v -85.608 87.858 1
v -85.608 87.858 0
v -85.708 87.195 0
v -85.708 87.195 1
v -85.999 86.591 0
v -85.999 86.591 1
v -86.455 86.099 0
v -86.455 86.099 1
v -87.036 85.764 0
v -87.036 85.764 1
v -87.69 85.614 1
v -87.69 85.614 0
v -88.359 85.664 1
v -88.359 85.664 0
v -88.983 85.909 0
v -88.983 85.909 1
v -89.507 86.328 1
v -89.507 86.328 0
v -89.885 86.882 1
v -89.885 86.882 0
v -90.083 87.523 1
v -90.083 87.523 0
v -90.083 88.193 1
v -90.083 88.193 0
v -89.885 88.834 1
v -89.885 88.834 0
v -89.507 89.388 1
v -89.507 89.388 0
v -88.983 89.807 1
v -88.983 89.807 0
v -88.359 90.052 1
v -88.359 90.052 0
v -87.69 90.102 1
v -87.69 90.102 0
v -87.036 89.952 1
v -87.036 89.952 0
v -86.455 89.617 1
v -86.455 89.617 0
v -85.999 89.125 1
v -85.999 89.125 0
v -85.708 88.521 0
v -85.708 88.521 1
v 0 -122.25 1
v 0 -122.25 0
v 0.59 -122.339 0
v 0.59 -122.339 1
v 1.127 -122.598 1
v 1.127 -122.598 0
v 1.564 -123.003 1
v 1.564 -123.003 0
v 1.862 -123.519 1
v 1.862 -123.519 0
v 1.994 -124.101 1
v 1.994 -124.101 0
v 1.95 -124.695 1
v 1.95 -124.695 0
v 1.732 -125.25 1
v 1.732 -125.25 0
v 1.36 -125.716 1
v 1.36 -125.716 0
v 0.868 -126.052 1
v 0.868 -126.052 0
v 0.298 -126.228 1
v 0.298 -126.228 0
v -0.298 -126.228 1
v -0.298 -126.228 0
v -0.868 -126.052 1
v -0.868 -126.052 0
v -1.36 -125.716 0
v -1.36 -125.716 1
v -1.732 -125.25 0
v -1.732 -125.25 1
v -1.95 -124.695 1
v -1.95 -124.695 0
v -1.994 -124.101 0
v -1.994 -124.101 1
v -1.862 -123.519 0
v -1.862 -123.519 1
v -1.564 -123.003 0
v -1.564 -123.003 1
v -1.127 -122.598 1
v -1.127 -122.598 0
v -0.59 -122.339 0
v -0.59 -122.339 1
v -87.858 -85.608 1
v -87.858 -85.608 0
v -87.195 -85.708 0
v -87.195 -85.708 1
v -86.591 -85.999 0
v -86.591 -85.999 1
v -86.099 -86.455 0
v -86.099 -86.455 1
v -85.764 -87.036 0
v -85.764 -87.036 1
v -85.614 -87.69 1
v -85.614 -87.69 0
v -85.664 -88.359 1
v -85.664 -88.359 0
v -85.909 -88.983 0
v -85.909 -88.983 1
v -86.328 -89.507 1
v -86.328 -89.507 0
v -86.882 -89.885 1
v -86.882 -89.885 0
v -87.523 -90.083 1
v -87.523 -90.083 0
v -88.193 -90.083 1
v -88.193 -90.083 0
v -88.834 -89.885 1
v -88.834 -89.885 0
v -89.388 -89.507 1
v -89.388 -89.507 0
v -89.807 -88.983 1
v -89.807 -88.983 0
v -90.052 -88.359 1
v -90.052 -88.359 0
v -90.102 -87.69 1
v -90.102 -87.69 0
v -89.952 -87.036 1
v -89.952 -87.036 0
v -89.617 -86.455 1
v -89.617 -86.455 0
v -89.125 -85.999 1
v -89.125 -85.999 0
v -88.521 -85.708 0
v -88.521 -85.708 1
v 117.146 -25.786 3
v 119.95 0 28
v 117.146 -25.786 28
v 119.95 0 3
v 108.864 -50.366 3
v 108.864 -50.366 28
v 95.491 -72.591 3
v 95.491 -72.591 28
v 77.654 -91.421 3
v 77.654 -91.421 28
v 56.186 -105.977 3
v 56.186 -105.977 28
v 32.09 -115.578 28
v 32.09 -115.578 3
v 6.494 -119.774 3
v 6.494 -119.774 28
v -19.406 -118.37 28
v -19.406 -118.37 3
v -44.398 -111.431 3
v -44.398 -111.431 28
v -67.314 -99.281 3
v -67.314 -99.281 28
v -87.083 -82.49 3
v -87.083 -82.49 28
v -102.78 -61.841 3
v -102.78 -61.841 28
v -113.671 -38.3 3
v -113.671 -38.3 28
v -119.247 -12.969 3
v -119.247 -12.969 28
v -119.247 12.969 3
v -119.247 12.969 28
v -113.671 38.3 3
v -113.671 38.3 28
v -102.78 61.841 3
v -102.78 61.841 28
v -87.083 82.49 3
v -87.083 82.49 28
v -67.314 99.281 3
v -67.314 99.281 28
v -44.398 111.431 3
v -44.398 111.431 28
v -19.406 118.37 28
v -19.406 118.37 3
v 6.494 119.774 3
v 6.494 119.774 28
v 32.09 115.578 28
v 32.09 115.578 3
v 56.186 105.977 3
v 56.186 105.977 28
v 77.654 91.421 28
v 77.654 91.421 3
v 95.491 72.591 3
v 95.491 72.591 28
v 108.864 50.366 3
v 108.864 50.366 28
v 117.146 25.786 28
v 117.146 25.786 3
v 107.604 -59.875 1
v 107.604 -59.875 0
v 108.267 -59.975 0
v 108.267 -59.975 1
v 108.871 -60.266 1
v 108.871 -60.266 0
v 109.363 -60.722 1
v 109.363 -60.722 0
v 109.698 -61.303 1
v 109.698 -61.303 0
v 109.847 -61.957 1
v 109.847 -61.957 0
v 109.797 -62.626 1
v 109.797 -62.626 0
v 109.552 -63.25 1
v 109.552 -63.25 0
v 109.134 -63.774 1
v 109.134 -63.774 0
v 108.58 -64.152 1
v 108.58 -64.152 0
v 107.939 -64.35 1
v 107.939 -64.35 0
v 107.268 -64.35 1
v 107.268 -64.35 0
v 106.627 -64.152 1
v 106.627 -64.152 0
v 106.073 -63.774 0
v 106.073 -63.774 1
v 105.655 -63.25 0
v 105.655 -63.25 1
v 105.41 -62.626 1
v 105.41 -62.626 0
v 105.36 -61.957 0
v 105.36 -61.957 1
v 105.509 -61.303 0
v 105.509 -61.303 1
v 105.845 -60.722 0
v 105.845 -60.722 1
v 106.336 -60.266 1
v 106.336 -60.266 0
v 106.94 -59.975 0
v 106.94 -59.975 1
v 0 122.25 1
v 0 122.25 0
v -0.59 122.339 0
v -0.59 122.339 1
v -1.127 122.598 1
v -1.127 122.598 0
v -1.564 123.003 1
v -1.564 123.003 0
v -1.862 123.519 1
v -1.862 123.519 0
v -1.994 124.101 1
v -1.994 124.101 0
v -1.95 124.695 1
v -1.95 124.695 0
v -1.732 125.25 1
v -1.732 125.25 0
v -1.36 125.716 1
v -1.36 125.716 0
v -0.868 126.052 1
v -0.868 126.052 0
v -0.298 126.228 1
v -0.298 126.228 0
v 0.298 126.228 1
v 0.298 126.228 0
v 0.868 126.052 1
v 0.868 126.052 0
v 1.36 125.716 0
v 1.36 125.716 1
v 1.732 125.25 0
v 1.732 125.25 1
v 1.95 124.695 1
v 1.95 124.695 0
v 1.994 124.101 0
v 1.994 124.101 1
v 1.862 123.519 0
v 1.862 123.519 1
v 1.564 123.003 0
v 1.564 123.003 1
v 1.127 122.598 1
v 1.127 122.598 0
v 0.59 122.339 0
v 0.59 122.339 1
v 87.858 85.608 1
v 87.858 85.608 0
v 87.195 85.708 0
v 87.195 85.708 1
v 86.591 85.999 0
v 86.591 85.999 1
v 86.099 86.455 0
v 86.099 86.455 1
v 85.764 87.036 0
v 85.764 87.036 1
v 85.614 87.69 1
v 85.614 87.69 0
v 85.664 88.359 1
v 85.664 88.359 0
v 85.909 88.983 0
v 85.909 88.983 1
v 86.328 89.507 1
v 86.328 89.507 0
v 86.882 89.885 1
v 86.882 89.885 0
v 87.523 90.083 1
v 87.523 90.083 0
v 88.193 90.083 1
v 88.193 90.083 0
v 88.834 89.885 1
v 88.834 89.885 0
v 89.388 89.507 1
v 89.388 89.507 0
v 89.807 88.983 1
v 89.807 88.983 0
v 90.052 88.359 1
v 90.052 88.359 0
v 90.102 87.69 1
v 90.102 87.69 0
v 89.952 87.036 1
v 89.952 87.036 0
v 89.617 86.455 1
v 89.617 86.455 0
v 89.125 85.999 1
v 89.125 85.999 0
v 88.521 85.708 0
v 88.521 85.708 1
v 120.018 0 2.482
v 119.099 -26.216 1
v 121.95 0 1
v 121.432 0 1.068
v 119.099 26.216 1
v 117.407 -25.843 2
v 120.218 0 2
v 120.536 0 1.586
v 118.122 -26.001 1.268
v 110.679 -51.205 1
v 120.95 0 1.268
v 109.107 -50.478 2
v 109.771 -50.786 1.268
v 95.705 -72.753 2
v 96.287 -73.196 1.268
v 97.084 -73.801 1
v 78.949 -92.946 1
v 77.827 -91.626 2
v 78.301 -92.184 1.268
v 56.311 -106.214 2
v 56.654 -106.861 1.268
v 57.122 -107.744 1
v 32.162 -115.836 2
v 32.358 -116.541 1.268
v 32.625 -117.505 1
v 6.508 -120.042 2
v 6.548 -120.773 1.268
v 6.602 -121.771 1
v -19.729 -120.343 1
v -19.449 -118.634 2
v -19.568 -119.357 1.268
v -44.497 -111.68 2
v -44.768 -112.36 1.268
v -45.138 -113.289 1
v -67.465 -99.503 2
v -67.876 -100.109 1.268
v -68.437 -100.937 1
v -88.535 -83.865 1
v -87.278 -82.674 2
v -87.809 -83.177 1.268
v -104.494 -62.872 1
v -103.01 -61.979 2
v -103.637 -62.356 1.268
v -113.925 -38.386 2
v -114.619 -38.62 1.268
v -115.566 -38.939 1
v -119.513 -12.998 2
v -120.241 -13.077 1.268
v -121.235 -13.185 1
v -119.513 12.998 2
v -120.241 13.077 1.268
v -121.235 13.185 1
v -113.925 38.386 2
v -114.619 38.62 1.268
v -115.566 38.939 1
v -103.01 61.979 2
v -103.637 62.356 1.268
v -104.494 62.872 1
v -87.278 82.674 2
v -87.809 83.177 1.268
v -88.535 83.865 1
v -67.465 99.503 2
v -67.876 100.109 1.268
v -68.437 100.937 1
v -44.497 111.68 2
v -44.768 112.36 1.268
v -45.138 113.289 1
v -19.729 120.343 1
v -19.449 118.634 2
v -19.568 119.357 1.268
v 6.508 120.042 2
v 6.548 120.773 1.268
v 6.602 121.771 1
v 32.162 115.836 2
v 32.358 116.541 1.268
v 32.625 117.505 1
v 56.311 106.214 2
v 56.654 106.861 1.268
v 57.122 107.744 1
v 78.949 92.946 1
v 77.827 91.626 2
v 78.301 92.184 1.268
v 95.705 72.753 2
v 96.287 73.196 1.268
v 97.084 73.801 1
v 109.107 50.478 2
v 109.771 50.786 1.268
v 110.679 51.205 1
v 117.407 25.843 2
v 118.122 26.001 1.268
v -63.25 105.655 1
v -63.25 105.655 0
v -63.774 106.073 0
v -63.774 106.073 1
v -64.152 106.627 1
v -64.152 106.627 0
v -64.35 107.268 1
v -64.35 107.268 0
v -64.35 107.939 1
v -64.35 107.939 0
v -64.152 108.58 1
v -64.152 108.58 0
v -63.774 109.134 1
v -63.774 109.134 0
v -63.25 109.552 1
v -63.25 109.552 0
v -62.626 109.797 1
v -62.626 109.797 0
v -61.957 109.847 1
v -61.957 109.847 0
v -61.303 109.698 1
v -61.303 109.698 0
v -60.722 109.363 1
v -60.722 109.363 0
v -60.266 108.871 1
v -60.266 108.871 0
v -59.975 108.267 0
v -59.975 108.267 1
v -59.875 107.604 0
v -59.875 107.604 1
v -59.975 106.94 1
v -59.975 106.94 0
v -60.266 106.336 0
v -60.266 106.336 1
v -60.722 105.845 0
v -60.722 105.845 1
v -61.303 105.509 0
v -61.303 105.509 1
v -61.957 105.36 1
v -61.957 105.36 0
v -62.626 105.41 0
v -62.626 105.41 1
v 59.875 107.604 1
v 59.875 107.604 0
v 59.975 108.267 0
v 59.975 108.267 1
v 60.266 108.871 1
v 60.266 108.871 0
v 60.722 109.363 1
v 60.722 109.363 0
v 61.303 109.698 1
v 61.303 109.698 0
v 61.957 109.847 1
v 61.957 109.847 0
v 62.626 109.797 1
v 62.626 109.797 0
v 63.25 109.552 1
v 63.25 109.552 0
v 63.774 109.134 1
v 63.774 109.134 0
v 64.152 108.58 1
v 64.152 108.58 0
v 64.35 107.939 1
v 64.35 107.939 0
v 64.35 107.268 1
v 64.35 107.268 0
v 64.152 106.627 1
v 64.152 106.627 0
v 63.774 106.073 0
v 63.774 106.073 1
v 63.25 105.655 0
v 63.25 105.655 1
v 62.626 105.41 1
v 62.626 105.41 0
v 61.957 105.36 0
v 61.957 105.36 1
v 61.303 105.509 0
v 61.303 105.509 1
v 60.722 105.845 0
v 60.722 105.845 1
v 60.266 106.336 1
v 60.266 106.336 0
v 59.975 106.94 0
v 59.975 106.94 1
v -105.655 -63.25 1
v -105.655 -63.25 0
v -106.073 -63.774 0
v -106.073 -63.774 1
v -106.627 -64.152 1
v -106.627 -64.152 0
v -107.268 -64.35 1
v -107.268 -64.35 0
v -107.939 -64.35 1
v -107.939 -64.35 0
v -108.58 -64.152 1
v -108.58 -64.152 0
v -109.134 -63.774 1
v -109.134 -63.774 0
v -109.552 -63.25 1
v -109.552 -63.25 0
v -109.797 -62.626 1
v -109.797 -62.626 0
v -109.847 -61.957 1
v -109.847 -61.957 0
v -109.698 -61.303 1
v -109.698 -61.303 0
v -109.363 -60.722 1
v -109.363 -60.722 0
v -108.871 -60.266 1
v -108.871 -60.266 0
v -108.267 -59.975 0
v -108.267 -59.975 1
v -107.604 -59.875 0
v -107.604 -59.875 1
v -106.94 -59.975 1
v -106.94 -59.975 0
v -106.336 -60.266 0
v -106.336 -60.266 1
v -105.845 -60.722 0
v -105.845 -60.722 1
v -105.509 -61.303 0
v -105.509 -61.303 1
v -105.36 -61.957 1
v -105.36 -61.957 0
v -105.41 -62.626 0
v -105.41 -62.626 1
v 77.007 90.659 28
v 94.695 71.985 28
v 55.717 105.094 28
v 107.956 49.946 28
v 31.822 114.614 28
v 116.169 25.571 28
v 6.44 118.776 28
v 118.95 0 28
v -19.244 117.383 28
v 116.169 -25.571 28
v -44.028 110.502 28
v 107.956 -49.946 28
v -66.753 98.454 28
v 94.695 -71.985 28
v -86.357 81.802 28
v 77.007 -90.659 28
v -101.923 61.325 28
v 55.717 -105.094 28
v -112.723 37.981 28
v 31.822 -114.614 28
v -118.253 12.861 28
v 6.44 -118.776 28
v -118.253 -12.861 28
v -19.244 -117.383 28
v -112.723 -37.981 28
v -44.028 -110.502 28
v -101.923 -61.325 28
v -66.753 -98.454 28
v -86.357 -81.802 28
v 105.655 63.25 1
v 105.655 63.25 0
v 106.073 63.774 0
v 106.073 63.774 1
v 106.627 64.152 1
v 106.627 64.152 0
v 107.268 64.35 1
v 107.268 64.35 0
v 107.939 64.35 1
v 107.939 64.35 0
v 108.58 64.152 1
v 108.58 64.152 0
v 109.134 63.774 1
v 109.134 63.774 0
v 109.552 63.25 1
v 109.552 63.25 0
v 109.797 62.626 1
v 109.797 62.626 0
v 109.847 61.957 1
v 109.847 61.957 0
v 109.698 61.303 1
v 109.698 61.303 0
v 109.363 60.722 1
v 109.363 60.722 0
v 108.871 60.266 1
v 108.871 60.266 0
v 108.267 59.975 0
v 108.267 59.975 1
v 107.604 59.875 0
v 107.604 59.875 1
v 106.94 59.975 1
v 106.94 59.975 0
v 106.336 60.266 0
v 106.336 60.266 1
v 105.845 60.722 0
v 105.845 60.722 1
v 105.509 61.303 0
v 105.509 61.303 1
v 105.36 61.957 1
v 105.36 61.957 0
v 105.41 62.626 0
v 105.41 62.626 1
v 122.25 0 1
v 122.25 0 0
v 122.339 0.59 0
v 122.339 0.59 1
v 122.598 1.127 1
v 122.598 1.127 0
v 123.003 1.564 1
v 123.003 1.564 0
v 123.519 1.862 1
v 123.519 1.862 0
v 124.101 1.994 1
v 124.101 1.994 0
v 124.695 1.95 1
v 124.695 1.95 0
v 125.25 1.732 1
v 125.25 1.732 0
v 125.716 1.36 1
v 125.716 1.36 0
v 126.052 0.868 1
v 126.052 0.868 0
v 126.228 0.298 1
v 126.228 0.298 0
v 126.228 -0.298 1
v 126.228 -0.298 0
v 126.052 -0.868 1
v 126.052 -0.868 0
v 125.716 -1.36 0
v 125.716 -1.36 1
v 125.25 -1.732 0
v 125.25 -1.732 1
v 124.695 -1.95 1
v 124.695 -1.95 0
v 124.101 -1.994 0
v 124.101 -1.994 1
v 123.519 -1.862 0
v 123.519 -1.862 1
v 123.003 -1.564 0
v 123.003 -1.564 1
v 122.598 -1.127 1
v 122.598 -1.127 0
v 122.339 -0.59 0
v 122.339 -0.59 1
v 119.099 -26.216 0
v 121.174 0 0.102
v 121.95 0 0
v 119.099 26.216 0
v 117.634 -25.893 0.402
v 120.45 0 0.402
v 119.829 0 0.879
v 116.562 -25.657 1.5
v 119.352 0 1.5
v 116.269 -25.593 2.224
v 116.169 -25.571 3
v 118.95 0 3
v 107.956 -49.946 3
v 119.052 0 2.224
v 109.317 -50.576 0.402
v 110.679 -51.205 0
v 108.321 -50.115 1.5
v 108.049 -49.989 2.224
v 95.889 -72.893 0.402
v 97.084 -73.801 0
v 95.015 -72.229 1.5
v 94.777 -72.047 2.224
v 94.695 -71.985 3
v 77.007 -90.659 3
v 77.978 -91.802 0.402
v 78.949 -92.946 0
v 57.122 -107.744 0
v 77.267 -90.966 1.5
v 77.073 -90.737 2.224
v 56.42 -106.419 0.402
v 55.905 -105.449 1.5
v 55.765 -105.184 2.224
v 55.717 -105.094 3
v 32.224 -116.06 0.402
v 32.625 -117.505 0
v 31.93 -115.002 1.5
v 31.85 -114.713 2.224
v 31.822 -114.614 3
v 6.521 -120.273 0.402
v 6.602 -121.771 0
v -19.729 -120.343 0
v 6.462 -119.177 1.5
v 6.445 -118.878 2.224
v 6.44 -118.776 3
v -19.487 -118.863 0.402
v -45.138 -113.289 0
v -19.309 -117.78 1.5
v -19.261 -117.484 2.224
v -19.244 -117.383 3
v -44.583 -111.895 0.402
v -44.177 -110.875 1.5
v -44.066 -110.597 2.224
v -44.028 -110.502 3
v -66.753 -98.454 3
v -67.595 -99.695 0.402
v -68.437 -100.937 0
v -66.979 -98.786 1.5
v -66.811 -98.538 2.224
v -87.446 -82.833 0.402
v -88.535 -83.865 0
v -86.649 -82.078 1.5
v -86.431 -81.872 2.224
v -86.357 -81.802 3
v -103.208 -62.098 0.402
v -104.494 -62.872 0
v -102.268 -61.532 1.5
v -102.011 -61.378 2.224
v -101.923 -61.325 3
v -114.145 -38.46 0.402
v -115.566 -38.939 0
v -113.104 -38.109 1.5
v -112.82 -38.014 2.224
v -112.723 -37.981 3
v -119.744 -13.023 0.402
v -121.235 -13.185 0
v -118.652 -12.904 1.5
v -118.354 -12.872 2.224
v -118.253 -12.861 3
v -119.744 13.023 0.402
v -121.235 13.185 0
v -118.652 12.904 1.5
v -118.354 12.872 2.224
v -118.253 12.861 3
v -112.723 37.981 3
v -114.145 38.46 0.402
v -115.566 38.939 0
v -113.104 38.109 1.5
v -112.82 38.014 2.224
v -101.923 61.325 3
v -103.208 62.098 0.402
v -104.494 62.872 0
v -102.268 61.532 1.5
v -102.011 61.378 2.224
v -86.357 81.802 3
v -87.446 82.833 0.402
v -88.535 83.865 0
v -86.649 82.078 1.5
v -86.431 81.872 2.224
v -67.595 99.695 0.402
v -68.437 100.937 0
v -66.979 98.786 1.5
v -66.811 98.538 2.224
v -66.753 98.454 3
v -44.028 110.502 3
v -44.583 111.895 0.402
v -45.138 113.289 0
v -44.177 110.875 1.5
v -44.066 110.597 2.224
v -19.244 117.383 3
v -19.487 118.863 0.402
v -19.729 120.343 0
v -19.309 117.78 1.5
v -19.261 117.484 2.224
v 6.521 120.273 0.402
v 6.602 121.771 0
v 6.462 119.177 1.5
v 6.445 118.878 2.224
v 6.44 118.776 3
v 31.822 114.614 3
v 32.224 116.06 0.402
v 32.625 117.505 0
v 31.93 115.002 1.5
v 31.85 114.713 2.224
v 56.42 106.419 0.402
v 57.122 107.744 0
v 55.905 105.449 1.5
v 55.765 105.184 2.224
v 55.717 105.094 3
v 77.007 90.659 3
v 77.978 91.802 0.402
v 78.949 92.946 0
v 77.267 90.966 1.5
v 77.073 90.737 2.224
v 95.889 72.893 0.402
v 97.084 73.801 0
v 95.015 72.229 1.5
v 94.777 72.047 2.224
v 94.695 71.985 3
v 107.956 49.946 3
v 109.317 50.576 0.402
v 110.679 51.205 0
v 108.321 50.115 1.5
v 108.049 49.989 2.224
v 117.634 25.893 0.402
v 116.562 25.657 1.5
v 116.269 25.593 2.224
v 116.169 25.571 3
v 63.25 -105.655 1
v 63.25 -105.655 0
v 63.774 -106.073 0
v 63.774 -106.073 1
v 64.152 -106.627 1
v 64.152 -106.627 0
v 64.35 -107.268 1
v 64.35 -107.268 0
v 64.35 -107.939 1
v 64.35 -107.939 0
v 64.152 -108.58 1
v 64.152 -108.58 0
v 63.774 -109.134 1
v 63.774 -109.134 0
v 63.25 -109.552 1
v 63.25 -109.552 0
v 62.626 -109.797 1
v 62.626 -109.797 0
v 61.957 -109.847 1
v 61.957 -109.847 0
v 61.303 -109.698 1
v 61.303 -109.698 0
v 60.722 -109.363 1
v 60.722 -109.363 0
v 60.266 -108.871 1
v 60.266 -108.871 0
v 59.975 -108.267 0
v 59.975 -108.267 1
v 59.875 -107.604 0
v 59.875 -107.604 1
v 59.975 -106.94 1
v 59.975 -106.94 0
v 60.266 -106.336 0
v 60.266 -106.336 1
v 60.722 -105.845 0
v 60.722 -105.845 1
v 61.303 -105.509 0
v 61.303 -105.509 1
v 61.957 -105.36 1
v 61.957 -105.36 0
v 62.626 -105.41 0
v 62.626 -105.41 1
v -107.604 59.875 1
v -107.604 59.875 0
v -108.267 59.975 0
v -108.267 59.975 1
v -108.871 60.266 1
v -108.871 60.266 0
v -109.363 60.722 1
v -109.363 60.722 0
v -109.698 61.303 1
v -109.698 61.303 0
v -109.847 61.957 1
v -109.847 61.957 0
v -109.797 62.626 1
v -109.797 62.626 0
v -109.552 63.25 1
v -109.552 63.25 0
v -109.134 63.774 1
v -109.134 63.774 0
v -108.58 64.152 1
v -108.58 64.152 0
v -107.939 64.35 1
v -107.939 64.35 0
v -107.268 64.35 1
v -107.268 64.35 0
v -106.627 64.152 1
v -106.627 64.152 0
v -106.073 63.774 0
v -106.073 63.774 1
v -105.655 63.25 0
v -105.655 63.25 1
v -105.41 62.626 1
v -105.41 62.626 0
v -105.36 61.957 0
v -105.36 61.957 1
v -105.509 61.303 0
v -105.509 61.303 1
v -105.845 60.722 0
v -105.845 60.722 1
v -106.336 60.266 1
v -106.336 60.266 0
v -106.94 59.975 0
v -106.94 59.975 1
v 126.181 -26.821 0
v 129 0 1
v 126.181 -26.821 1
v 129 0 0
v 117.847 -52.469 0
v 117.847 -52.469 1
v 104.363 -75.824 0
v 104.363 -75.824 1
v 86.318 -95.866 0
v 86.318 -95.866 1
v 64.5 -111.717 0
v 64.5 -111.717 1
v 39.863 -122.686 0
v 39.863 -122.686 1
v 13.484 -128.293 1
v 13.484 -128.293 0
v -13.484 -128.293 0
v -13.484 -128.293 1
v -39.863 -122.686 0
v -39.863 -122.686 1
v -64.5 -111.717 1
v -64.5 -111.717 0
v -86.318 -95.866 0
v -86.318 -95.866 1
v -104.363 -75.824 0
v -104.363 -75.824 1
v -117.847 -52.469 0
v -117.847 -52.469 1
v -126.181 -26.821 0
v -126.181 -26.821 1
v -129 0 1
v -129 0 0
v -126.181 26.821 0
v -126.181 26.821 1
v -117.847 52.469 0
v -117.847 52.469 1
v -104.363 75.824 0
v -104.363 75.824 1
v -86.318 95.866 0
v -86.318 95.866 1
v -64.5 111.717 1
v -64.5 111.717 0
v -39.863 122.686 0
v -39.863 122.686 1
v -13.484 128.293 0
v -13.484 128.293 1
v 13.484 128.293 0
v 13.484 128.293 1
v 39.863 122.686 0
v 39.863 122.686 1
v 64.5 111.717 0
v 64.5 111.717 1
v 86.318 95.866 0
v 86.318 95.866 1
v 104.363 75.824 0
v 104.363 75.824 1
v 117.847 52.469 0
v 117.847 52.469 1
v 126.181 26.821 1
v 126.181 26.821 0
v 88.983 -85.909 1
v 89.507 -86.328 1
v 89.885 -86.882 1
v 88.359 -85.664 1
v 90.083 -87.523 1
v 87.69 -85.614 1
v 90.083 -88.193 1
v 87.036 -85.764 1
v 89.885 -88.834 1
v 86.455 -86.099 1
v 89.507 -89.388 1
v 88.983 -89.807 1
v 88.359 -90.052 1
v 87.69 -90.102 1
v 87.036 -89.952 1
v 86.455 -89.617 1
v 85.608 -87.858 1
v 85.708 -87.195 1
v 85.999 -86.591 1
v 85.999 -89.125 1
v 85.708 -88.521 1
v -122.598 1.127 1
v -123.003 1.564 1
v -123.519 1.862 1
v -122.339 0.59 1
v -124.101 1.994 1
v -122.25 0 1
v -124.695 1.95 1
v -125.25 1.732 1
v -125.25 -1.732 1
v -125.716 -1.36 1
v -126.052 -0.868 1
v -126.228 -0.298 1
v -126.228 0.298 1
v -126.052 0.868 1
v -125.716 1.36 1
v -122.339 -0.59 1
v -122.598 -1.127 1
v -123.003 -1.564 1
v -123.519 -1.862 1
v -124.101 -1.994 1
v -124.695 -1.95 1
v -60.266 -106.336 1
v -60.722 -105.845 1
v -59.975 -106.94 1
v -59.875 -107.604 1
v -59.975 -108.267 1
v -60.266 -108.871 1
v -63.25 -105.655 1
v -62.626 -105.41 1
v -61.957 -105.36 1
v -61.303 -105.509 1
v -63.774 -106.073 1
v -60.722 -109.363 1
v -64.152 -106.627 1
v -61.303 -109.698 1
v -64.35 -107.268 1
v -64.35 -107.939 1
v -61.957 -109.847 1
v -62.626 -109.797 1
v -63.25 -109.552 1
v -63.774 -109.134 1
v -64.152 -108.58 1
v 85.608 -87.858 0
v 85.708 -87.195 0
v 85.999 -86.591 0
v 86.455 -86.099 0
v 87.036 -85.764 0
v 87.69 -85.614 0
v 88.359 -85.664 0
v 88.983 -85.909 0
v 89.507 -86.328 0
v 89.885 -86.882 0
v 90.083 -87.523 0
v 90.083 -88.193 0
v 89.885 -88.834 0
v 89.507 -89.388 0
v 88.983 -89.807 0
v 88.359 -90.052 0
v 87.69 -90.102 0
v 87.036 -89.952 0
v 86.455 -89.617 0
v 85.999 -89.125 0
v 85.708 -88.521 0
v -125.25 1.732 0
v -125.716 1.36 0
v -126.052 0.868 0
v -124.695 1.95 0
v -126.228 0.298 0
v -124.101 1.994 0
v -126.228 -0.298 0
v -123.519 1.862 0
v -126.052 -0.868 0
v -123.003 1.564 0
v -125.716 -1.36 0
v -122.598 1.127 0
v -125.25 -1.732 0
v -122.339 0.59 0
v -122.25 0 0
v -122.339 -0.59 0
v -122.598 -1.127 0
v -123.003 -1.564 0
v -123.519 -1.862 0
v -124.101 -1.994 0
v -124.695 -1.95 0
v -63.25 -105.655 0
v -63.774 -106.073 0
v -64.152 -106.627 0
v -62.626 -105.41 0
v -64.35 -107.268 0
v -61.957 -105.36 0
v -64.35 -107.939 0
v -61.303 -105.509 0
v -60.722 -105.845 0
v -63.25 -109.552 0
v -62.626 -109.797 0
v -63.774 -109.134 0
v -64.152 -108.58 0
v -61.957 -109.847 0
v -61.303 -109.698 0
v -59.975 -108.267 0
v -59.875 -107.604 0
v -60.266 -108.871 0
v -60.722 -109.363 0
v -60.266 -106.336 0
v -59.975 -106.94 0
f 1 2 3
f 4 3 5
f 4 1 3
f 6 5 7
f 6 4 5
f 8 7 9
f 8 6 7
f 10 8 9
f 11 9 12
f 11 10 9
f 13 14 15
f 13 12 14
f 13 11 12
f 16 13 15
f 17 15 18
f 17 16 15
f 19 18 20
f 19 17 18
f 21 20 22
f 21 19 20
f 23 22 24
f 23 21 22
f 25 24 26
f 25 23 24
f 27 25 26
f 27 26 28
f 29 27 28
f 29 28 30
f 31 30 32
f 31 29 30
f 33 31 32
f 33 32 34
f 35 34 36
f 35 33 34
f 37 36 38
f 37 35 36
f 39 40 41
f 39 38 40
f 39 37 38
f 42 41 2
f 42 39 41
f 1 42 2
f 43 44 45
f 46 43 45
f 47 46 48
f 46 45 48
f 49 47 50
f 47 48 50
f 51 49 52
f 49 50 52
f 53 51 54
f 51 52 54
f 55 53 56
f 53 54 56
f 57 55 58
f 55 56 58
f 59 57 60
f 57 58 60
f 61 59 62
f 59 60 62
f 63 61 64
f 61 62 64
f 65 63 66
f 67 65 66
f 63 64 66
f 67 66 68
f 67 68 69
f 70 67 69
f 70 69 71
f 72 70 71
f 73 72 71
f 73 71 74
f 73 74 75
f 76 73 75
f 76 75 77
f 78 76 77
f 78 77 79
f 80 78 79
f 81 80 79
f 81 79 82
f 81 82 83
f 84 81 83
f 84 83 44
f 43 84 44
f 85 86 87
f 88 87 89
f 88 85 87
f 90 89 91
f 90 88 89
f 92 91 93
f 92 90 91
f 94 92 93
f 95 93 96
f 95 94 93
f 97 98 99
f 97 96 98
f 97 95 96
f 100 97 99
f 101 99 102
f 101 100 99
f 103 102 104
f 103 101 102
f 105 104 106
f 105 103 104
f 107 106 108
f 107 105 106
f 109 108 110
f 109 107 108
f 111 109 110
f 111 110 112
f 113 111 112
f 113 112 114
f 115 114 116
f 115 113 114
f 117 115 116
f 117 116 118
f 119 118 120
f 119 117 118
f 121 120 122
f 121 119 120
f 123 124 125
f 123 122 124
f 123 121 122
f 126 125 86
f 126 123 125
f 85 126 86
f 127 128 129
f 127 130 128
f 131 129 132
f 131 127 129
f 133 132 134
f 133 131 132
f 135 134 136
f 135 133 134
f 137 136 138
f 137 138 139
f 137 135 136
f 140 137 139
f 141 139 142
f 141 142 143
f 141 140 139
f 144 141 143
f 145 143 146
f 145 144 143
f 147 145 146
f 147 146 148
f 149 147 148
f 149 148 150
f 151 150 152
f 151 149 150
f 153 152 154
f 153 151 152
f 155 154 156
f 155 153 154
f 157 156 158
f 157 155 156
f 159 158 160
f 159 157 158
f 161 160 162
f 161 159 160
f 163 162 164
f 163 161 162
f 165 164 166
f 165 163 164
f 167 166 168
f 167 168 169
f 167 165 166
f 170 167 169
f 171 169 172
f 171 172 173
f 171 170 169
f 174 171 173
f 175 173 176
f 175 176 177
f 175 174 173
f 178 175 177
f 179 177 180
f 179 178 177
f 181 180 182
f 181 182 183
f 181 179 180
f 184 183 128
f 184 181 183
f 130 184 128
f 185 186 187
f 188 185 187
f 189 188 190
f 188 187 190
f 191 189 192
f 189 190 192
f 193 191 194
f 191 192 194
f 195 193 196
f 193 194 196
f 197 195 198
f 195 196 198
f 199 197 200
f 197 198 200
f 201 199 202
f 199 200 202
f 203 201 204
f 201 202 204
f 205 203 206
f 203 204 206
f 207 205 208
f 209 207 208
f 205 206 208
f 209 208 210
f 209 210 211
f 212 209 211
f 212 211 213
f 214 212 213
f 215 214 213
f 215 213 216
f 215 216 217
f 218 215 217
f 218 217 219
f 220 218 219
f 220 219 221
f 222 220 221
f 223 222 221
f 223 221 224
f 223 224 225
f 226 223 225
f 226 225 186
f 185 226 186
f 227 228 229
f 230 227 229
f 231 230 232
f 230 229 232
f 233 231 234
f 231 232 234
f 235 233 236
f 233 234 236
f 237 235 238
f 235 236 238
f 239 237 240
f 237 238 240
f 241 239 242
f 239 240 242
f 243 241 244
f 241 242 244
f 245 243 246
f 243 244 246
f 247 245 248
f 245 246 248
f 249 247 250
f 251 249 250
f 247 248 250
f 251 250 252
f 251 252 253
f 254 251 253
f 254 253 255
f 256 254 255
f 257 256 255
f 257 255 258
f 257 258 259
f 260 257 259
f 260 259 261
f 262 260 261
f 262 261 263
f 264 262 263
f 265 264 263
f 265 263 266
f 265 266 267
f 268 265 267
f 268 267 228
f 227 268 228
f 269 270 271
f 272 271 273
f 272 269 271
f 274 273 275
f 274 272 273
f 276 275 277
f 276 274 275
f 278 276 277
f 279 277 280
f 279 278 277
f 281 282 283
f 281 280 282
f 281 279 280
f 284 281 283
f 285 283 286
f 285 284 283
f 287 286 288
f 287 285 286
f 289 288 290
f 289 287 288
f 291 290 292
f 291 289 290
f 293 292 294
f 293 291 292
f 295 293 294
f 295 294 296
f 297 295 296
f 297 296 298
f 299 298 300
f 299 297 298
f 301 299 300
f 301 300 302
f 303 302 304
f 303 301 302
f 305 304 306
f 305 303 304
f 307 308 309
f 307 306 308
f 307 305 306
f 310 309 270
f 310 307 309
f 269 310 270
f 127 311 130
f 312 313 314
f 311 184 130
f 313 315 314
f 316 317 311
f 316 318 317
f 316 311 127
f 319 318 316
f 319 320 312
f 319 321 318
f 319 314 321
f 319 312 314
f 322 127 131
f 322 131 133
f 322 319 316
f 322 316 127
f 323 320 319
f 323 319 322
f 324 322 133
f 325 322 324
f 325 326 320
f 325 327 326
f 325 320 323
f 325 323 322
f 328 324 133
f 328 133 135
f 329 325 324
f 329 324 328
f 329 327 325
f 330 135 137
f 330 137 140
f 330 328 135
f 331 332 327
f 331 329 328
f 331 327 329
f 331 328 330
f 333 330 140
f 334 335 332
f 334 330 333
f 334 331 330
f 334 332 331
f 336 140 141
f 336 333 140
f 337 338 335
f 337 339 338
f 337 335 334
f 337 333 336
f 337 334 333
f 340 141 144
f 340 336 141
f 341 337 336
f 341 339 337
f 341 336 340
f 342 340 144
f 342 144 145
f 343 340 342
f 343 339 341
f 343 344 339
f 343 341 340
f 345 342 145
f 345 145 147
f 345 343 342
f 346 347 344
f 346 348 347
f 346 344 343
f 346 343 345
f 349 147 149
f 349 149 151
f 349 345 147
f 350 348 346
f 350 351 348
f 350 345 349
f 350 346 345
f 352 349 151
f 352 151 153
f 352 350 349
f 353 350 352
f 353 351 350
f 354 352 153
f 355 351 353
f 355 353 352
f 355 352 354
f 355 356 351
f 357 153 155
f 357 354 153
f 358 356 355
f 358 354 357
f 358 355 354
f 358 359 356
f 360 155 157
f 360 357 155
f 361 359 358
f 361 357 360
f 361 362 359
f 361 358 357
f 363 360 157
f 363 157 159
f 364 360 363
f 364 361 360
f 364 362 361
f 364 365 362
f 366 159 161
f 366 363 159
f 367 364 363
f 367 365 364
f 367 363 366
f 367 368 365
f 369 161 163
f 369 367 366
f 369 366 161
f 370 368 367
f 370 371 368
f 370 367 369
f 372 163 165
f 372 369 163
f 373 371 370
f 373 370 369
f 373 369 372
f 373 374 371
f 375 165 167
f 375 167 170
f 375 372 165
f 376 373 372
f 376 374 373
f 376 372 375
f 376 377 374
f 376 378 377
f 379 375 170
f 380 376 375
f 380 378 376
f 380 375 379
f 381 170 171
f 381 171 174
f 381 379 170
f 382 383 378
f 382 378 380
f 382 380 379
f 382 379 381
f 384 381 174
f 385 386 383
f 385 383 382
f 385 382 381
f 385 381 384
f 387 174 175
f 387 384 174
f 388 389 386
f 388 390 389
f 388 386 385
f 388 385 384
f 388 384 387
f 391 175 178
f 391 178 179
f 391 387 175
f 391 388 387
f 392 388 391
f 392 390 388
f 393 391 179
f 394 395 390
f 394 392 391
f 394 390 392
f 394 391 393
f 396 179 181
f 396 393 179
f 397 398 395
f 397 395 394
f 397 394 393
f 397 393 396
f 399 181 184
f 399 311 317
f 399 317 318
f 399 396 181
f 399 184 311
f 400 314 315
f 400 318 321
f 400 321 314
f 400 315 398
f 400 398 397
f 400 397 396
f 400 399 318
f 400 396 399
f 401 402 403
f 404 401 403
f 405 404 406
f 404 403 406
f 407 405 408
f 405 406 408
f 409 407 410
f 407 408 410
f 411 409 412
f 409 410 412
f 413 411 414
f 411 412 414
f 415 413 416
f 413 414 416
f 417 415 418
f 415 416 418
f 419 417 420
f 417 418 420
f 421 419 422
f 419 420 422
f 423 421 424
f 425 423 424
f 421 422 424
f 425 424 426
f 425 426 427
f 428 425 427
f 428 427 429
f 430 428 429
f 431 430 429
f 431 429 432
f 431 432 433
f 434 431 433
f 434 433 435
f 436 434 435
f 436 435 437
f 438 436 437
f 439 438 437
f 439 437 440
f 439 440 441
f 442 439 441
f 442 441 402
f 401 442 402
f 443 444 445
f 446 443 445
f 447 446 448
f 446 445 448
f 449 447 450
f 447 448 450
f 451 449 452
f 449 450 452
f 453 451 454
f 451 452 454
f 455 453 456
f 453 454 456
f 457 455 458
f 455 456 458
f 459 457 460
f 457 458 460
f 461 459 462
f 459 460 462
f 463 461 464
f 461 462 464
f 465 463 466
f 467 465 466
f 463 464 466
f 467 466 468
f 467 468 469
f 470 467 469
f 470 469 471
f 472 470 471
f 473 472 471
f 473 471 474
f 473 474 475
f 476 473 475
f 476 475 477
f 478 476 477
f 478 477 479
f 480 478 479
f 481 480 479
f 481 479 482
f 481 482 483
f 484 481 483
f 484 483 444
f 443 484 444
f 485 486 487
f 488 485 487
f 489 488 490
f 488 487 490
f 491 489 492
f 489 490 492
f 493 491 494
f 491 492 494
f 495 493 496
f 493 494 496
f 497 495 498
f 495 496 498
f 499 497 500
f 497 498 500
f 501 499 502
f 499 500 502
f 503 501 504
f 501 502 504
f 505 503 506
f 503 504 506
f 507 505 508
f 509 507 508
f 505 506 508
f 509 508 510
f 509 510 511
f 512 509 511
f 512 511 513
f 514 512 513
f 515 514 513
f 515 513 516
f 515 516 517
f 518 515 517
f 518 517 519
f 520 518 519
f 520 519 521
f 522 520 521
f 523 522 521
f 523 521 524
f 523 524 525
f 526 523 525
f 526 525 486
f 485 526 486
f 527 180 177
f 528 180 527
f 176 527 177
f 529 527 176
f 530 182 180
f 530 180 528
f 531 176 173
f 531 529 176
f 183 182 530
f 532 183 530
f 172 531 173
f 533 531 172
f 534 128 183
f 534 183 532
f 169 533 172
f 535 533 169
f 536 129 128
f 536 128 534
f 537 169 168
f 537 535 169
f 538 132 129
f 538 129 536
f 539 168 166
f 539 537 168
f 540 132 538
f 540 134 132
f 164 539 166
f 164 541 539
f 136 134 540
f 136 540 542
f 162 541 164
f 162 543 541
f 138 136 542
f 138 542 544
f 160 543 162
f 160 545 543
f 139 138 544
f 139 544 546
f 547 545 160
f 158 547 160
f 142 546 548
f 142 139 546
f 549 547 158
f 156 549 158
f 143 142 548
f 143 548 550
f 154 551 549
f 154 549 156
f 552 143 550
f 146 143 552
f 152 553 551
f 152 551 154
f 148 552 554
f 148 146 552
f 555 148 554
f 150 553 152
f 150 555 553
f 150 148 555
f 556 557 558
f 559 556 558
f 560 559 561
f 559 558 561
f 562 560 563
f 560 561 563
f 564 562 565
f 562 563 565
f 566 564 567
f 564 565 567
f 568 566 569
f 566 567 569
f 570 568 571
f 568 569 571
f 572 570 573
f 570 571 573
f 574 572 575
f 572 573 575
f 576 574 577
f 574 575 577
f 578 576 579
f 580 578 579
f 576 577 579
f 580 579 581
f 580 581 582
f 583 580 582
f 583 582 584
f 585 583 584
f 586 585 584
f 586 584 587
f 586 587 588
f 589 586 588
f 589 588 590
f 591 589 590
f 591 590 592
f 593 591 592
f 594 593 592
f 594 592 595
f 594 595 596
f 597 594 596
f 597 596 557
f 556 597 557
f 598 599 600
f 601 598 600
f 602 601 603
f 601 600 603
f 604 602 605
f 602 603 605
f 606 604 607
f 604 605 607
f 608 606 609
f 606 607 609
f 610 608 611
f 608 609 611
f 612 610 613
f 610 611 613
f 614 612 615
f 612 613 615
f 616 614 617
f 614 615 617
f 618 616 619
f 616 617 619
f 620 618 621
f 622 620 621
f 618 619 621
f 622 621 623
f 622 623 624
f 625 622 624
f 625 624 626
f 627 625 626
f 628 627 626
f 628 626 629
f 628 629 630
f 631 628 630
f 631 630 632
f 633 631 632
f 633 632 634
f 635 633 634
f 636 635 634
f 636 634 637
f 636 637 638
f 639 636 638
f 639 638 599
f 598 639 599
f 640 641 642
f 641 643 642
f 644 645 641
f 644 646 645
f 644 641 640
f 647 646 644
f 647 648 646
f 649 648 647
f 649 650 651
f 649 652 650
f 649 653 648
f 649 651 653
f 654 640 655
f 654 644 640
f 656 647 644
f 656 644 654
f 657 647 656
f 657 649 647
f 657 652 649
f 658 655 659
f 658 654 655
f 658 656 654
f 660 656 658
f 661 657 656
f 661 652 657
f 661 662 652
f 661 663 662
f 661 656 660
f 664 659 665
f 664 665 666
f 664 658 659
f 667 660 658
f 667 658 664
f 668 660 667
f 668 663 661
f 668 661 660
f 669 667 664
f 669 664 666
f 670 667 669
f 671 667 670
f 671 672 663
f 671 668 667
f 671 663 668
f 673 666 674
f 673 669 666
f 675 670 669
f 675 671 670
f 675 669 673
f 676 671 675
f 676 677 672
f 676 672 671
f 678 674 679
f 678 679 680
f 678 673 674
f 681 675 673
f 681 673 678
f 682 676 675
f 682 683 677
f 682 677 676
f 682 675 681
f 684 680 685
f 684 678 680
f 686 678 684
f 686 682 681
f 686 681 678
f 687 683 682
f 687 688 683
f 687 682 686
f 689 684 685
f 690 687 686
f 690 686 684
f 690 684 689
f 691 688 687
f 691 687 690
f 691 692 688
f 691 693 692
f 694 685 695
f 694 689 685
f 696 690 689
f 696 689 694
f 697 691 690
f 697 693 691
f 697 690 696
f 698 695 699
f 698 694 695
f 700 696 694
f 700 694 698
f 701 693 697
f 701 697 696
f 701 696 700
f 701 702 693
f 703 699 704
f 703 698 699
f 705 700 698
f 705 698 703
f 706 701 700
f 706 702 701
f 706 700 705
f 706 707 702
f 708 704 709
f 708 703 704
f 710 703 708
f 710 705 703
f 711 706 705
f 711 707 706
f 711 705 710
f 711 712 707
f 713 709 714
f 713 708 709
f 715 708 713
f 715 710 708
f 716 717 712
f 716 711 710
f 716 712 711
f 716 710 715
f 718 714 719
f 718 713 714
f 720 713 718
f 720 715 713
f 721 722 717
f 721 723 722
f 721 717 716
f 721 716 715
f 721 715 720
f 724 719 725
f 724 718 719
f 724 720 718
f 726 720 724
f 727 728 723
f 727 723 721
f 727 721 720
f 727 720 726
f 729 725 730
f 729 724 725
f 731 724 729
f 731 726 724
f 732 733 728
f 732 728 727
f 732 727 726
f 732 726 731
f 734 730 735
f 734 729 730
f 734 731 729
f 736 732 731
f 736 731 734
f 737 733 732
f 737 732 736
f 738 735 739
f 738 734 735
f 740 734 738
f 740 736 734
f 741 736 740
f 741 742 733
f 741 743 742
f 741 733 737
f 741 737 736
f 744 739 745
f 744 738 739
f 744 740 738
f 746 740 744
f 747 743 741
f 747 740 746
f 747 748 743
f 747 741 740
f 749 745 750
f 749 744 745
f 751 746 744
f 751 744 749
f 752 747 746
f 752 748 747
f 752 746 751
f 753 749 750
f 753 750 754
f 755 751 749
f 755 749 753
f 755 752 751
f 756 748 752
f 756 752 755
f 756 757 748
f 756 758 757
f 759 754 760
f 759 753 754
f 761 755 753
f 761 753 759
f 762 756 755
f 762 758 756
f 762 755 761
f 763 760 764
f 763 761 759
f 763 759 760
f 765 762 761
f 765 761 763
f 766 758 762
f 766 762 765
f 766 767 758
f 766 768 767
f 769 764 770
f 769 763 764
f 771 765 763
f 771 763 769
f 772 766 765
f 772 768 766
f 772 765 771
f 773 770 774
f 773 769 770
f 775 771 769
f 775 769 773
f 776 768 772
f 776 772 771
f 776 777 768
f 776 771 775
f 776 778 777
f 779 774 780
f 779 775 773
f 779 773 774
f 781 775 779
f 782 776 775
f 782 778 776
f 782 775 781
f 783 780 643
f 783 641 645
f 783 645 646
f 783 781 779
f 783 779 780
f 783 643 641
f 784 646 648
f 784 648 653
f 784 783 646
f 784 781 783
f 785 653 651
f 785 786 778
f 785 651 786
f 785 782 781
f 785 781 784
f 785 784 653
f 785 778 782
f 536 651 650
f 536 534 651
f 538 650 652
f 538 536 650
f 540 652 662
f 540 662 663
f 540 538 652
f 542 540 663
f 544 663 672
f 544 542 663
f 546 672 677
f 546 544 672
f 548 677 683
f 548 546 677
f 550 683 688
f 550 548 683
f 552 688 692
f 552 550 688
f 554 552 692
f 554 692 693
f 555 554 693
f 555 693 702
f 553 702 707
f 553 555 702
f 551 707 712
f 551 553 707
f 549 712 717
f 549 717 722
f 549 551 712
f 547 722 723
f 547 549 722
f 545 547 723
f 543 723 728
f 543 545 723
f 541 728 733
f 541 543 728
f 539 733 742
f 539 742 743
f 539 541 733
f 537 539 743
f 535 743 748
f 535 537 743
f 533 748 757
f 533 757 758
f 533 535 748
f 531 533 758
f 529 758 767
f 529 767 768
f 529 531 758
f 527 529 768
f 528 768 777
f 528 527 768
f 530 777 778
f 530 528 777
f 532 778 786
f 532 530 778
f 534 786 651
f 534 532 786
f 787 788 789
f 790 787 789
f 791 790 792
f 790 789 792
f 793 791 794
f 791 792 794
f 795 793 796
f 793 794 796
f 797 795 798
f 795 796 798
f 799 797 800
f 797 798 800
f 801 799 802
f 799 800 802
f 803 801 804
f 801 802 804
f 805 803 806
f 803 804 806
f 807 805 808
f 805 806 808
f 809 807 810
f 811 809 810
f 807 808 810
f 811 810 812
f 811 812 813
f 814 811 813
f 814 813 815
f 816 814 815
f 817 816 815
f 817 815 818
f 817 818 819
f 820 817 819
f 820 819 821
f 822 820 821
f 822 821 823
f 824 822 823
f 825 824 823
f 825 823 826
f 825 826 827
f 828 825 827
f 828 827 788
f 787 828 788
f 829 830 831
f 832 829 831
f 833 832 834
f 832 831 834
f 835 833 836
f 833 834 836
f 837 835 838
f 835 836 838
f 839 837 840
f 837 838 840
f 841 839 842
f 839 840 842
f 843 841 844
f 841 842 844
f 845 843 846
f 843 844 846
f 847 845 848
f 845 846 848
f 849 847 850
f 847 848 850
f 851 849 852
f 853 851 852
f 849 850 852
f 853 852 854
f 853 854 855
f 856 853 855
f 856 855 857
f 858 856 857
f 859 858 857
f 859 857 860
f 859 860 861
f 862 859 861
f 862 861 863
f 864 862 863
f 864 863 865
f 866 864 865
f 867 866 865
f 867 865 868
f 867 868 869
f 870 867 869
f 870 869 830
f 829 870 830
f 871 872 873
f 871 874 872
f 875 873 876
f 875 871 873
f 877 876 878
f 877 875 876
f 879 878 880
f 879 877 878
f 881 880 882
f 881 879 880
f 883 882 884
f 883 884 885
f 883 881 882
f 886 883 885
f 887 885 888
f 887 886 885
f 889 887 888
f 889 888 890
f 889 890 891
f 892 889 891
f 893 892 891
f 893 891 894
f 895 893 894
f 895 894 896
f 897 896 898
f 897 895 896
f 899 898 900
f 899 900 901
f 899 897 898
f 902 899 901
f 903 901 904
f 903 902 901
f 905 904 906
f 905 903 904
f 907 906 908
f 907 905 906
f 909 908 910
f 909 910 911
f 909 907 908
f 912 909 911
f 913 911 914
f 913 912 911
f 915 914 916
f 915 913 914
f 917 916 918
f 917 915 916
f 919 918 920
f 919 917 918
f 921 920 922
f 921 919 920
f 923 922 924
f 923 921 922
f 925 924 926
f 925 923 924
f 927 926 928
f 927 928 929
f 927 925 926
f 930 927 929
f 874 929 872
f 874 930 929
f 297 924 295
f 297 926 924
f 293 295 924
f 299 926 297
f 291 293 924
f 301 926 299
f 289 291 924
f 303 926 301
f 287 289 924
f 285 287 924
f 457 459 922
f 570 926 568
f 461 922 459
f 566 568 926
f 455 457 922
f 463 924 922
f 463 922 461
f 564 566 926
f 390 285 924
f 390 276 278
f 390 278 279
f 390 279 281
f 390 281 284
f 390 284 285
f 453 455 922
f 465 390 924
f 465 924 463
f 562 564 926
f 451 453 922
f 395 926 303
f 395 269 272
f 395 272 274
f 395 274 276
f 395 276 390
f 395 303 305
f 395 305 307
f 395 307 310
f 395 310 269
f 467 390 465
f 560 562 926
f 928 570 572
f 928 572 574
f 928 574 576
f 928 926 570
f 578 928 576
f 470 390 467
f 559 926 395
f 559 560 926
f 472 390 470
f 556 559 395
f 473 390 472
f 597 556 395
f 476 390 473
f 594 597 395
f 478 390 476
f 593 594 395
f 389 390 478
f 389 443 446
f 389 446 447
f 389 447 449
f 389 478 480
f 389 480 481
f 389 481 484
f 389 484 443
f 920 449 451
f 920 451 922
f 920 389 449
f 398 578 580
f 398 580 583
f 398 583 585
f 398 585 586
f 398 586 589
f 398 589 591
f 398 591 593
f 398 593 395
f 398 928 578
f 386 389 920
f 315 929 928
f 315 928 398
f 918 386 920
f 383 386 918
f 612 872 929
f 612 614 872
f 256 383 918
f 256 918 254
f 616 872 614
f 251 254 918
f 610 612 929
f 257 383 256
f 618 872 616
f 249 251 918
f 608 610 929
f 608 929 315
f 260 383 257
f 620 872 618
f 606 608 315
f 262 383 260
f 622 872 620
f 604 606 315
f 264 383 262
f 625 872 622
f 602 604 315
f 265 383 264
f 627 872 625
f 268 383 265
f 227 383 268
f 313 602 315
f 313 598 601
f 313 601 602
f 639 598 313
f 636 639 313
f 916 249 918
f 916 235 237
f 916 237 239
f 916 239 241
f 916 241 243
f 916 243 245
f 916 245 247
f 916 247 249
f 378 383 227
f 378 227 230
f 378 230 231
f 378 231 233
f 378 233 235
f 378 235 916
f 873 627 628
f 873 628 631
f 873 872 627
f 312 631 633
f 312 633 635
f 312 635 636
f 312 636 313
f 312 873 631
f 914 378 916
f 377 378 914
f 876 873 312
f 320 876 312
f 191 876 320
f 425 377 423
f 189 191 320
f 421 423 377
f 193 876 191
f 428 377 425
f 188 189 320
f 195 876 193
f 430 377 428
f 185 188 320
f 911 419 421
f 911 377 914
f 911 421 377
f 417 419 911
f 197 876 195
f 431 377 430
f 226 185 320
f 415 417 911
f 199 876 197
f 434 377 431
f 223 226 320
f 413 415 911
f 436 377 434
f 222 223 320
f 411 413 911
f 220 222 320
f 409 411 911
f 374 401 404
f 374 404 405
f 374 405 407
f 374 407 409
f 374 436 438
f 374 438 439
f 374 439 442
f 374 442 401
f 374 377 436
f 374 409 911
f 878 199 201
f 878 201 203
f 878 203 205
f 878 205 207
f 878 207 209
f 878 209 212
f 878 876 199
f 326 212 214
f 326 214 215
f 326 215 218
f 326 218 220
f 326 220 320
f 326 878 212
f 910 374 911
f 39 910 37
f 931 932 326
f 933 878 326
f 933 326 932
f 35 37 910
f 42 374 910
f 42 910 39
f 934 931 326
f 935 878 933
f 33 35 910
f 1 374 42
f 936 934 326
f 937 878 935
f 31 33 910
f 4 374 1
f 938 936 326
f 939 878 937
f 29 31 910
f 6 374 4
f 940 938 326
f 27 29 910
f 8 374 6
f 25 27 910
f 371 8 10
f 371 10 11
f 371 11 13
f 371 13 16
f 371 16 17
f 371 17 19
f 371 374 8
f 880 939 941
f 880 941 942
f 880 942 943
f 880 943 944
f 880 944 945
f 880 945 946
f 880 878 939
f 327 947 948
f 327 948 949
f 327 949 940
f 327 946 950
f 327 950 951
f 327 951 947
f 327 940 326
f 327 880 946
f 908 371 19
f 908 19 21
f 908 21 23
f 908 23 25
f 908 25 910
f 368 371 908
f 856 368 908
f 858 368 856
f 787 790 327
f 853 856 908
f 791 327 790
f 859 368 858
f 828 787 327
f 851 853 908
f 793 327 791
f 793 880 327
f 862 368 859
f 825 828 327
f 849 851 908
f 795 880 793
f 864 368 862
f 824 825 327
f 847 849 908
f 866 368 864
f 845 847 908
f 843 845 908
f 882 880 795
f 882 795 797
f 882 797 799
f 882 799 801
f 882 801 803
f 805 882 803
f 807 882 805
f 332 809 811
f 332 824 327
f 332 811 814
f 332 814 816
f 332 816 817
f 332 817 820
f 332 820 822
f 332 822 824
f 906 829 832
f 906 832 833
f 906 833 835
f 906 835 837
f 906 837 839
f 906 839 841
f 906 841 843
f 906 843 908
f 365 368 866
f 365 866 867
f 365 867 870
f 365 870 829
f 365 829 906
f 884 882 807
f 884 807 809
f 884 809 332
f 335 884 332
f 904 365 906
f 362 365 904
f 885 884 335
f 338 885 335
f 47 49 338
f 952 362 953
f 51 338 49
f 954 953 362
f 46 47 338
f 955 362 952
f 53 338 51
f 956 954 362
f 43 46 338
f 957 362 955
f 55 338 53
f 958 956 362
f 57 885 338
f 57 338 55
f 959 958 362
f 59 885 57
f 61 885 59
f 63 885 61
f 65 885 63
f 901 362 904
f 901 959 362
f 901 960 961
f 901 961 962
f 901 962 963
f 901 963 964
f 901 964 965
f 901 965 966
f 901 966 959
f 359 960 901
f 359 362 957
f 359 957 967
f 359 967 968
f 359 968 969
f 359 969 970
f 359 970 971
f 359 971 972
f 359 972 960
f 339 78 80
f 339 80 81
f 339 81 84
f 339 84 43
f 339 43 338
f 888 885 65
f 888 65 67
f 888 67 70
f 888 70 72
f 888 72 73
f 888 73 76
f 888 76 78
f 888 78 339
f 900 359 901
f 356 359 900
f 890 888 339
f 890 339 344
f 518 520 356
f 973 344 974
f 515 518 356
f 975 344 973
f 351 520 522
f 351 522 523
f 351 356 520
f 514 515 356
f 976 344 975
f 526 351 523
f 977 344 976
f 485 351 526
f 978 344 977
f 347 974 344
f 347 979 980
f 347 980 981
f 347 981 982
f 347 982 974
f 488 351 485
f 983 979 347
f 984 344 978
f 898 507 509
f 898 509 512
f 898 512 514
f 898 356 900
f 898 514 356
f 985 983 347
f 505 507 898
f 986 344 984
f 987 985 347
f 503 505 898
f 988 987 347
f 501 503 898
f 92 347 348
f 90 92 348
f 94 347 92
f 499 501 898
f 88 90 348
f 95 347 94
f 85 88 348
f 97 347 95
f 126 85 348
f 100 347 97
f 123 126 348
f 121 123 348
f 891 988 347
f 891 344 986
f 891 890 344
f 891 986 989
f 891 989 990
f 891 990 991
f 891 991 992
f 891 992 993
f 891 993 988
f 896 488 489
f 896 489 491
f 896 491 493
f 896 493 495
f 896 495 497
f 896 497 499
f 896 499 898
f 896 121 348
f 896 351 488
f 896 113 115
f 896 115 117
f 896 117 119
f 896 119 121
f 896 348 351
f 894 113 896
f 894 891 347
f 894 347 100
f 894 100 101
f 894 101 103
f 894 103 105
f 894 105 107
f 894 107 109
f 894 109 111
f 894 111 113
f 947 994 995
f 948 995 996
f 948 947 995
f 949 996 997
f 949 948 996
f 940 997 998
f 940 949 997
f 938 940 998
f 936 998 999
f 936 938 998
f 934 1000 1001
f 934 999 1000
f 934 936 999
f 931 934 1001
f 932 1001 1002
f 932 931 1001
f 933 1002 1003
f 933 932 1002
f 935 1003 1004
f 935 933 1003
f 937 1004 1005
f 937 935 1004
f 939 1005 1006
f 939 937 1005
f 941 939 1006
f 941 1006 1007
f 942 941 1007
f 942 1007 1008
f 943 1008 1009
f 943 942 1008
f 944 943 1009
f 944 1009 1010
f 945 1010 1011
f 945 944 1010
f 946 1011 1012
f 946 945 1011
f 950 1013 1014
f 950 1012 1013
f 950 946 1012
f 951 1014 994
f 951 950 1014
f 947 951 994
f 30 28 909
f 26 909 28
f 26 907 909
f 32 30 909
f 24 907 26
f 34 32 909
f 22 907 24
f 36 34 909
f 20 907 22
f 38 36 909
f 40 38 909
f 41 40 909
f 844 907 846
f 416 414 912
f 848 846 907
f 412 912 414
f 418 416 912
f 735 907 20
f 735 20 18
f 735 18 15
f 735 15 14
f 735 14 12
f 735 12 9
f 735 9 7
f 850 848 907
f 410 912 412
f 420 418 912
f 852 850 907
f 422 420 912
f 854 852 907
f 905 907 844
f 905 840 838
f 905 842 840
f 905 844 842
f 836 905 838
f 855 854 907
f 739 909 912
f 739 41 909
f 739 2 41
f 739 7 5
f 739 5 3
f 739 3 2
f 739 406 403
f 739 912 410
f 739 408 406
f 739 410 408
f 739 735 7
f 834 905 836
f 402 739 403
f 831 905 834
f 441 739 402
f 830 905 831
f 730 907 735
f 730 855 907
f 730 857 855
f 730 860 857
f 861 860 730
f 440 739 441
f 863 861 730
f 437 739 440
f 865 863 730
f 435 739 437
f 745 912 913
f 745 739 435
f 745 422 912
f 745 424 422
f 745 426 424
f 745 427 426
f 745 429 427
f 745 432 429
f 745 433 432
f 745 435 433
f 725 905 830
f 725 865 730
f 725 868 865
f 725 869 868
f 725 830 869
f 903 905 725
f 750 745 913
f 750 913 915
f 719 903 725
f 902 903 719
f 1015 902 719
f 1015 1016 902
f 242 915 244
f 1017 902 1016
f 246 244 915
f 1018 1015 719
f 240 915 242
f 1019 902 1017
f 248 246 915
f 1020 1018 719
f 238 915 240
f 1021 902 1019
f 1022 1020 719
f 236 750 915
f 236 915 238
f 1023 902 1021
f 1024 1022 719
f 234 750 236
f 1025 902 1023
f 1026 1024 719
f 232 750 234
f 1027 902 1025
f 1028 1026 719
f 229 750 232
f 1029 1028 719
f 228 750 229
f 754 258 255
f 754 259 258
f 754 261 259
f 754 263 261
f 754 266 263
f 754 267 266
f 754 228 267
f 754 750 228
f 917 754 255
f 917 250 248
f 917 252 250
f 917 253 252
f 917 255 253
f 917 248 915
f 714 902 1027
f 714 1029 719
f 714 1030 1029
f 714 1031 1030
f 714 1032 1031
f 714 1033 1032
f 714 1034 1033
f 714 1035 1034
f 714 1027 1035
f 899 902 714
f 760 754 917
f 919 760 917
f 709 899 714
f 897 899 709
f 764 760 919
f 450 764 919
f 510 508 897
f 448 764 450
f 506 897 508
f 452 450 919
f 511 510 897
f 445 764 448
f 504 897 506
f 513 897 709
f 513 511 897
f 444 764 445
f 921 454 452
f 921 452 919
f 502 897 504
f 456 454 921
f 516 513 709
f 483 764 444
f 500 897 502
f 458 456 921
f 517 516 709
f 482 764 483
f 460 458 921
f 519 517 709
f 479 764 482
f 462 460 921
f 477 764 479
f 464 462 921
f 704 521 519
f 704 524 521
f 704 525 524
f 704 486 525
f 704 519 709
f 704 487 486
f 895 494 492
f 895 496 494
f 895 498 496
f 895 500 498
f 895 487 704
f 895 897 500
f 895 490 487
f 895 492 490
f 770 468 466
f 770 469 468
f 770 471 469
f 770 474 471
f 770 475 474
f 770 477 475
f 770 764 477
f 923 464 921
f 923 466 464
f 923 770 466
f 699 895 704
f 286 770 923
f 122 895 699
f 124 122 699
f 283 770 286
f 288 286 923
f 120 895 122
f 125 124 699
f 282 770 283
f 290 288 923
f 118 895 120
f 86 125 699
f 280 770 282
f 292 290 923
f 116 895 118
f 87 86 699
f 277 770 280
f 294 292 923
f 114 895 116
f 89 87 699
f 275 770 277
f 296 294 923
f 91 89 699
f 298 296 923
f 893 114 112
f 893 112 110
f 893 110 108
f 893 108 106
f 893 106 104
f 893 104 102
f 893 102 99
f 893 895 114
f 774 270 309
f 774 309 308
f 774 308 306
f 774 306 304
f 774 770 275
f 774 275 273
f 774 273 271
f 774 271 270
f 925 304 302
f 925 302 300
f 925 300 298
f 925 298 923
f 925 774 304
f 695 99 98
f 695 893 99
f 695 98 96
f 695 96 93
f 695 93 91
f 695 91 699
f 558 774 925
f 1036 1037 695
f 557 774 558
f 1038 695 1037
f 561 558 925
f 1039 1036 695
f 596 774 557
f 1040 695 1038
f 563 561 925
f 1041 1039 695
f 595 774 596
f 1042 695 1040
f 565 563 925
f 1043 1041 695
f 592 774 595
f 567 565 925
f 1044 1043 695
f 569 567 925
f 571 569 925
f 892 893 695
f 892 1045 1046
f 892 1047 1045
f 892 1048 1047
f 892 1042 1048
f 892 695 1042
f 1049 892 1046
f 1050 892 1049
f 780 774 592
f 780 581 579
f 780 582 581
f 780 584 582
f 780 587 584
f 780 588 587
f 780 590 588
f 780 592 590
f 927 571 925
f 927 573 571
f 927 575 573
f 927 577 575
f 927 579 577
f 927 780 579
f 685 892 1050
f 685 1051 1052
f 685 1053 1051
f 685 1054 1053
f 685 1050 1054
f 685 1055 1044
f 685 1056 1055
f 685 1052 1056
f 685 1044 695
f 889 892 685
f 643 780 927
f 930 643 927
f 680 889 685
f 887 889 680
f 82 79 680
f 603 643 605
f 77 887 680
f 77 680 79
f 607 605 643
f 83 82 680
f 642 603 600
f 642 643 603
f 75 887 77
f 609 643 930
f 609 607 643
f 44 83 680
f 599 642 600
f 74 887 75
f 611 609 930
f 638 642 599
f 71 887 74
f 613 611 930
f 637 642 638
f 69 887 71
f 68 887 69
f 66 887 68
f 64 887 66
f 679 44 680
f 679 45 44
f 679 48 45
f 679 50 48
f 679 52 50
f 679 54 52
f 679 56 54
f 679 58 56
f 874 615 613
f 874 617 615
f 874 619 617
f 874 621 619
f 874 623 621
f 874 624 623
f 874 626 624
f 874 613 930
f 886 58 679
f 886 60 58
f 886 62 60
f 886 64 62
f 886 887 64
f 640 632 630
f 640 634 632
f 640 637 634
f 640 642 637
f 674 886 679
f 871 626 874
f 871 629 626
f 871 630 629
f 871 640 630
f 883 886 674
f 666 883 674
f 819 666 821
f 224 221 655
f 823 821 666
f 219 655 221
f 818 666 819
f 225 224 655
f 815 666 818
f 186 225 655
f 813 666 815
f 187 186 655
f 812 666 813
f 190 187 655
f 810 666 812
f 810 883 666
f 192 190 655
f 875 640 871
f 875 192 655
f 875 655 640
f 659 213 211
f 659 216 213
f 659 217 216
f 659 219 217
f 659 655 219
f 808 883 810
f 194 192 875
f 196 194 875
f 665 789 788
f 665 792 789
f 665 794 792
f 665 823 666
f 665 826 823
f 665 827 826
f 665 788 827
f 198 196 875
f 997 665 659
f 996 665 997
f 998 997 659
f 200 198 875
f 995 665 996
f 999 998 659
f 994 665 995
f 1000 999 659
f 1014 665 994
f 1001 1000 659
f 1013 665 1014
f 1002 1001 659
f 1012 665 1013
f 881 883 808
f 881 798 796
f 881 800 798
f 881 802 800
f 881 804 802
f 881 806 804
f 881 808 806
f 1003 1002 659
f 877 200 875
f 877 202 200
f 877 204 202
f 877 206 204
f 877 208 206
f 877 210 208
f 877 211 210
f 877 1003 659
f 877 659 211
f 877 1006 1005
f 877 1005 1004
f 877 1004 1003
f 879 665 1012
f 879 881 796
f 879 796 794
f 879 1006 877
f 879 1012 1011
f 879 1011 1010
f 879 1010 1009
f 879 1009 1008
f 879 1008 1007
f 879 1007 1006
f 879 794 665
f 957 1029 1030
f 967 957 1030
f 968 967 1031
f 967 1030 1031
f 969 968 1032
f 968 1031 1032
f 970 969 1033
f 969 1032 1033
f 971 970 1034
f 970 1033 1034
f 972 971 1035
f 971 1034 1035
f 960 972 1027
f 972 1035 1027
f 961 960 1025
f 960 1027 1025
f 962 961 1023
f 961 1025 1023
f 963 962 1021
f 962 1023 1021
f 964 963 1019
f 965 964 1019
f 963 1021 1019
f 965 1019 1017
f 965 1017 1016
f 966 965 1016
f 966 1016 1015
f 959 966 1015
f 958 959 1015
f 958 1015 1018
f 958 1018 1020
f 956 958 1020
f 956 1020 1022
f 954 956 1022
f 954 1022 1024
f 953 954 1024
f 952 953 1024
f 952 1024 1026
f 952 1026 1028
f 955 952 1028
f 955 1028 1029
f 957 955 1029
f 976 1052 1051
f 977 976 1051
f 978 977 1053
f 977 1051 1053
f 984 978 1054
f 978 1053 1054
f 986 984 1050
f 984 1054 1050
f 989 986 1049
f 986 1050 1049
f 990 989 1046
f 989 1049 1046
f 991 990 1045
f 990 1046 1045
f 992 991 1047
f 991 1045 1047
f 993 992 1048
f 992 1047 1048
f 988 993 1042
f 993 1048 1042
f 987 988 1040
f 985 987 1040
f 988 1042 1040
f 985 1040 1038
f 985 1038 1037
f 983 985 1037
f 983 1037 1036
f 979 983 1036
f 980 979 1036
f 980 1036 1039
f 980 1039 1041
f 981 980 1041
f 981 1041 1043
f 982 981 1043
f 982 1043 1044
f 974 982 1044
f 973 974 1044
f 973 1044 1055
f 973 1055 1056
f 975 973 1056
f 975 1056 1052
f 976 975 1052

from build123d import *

# Parameters (mm, degrees)
F_4_5_4_5_DIAMETER_HOLE1_D = 4.5
CIRPATTERN1_COUNT          = 12
F_4_0_4_DIAMETER_HOLE1_D   = 4
CIRPATTERN2_COUNT          = 4
CIRPATTERN3_COUNT          = 4


with BuildPart() as part:
    # Sketch1 → Revolve1 (revolve)
    with BuildSketch(Plane(origin=(0, 0, 0), x_dir=(0, 0, -1), z_dir=(1, 0, 0)), mode=Mode.PRIVATE) as revolve1_sk:
        with BuildLine():
            Line((0, 129), (0, 121.95))
            ThreePointArc((0, 121.95), (-0.878679656, 119.828679656), (-3, 118.95))
            Line((-3, 118.95), (-28, 118.95))
            Line((-28, 118.95), (-28, 119.95))
            Line((-28, 119.95), (-3, 119.95))
            ThreePointArc((-3, 119.95), (-1.585786438, 120.535786438), (-1, 121.95))
            Line((-1, 121.95), (-1, 129))
            Line((-1, 129), (0, 129))
        make_face()
    revolve(revolve1_sk.sketch.rotate(Axis((0, 0, 36.289125048), (0, 0, -1)), 90), axis=Axis((0, 0, 36.289125048), (0, 0, -1)))  # turned: the seam where the file's is

    # Ø4.5 (4.5) Diameter Hole1 (through all)
    with Locations(Plane.XY.offset(1)):
        with Locations((62.125, 107.60365642)):
            f_4_5_4_5_diameter_hole1 = Hole(F_4_5_4_5_DIAMETER_HOLE1_D / 2)

    # CirPattern1: Ø4.5 (4.5) Diameter Hole1 ×12 about axis, 4 skipped
    cirpattern1_axis = Axis((0, 0, -80.9), (0, 0, 1))
    add([f_4_5_4_5_diameter_hole1.rotate(cirpattern1_axis, i * 360 / CIRPATTERN1_COUNT) for i in range(1, CIRPATTERN1_COUNT) if i not in (1, 4, 7, 10)], mode=Mode.SUBTRACT)

    # Ø4.0 (4) Diameter Hole1 (through all)
    with Locations(Plane.XY.offset(1)):
        with Locations((124.25, 0)):
            f_4_0_4_diameter_hole1 = Hole(F_4_0_4_DIAMETER_HOLE1_D / 2)

    # CirPattern2: Ø4.0 (4) Diameter Hole1 ×4 about axis
    cirpattern2_axis = Axis((0, 0, 0), (0, 0, 1))
    for i in range(1, CIRPATTERN2_COUNT):
        add(f_4_0_4_diameter_hole1.rotate(cirpattern2_axis, i * 360 / CIRPATTERN2_COUNT), mode=Mode.SUBTRACT)

    # Sketch7 → Ø4.5 (4.5) Diameter Hole2 (revolve, cut)
    with BuildSketch(Plane(origin=(87.858017562, 87.858017562, 1), x_dir=(0, -1, 0), z_dir=(1, 0, 0))):
        Polygon((0, 0), (0, 2.851936393), (2.25, 1.5), (2.25, 0), align=None)
    f_4_5_4_5_diameter_hole2 = revolve(axis=Axis((87.858017562, 87.858017562, 7.35), (0, 0, -1)), mode=Mode.SUBTRACT)

    # CirPattern3: Ø4.5 (4.5) Diameter Hole2 ×4 about axis
    cirpattern3_axis = Axis((0, 0, 0), (0, 0, 1))
    for i in range(1, CIRPATTERN3_COUNT):
        add(f_4_5_4_5_diameter_hole2.rotate(cirpattern3_axis, i * 360 / CIRPATTERN3_COUNT), mode=Mode.SUBTRACT)


solid = part.part
